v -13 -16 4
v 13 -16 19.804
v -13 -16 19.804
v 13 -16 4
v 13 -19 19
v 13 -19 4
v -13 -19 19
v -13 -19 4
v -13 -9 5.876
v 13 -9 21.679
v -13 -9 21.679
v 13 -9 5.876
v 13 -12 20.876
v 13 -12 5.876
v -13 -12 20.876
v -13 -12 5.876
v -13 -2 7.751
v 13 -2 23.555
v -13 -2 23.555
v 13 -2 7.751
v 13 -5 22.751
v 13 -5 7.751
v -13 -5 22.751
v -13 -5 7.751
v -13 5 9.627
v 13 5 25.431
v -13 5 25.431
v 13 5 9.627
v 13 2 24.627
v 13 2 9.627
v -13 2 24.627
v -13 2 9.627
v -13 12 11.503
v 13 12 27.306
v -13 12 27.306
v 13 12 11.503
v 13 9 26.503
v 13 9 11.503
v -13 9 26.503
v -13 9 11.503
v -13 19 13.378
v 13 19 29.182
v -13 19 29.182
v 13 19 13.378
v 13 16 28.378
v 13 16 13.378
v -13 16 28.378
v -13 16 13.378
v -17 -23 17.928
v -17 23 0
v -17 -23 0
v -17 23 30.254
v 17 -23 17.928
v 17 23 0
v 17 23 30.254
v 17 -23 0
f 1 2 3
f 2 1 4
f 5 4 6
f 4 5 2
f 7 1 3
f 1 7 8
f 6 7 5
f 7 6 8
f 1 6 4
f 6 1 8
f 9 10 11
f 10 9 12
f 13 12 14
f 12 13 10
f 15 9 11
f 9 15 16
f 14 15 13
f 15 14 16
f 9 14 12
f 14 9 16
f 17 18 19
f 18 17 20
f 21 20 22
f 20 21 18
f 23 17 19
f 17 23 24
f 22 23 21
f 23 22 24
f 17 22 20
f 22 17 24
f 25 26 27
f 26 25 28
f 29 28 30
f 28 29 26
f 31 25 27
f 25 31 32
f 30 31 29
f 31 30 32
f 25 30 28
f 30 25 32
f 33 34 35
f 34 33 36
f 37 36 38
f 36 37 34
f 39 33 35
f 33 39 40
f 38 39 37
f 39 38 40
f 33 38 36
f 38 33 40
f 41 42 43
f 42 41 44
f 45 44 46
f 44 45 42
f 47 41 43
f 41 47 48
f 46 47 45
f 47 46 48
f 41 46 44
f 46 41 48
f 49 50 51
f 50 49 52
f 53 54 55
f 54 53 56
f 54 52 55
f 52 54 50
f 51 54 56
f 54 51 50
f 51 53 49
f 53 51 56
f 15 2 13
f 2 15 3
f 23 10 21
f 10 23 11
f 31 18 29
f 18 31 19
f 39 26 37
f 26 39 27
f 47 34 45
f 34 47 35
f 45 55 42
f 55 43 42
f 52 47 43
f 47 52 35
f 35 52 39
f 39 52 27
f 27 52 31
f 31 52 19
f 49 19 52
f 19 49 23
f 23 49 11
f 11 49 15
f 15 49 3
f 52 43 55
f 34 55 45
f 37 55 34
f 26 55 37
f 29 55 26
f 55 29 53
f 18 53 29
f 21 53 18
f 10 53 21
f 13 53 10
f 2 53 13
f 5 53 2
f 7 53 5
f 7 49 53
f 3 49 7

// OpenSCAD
// Parameterized SD card holder, PAmes
//
// Published at:
//    http://www.thingiverse.com/thing:15323
//
// Derivative of http://www.thingiverse.com/thing:9218 by jpcw
//
// Can adjust the number of slots, and the slot size

// The slot, of course, should be a little larger than the card.
// Adjust for desired fit.  I use these numbers on my TOM/Mk7,
// which give a slightly loose fit (the cards will fall out easily
// if turned over).  If you want to adjust the slot size, try
// experimenting by setting 'slots' to 1.
// All units are mm.

slots = 6;  // As many or as few as you want
slotWidth = 26;
slotThickness = 3; // front to back
slotSeparation = 4;  // Barrier between slots
slotDepth = 15; // This much of the card fits into the slot, half of the card height seems about right.
topRiseAngle = 15; // degrees


// These should be OK as is.  Adjust if you want wider borders.
bottomHeight = slotSeparation; // bottom of first hole to bottom of holder
sideWidth    = slotSeparation; // left, right borders
frontDepth   = slotSeparation; // front to first hole
backDepth    = slotSeparation; // back to last hole


// Shouldn't have to mess with these.
holderWidth = slotWidth + 2*sideWidth;
holderFrontHeight = slotDepth + bottomHeight - tan(topRiseAngle)*frontDepth;
holderDepth = frontDepth + slotThickness*slots +
            slotSeparation*(slots-1) + backDepth;
holderBackHeight = holderFrontHeight + tan(topRiseAngle)*holderDepth;

module basicBlock() {
  linear_extrude(height=holderWidth, convexity=2)
    polygon(points = [ [0, 0],
                     [holderDepth, 0],
                     [holderDepth, holderBackHeight],
                     [0, holderFrontHeight] ]);
}

// One slot, at first location
module slot() {
  translate([frontDepth, bottomHeight,0])
    translate([0,0,sideWidth])
      cube(size=[slotThickness, holderBackHeight, slotWidth]); // sticks up, used by difference()
}

// Makes all slots
module slots() {
  for (i = [0 : slots-1]) {
    translate([i*(slotSeparation+slotThickness), i*tan(topRiseAngle)*(slotSeparation+slotThickness), 0])
      slot();
  }
}

// Put it all together
module SDCardHolder() {
  // Place into nice orientation
  rotate([0,0,90])
    translate([-holderDepth/2,holderWidth/2,0])
      rotate([90,0,0])
        difference() {
          basicBlock();
          slots();
        }
}

SDCardHolder();
